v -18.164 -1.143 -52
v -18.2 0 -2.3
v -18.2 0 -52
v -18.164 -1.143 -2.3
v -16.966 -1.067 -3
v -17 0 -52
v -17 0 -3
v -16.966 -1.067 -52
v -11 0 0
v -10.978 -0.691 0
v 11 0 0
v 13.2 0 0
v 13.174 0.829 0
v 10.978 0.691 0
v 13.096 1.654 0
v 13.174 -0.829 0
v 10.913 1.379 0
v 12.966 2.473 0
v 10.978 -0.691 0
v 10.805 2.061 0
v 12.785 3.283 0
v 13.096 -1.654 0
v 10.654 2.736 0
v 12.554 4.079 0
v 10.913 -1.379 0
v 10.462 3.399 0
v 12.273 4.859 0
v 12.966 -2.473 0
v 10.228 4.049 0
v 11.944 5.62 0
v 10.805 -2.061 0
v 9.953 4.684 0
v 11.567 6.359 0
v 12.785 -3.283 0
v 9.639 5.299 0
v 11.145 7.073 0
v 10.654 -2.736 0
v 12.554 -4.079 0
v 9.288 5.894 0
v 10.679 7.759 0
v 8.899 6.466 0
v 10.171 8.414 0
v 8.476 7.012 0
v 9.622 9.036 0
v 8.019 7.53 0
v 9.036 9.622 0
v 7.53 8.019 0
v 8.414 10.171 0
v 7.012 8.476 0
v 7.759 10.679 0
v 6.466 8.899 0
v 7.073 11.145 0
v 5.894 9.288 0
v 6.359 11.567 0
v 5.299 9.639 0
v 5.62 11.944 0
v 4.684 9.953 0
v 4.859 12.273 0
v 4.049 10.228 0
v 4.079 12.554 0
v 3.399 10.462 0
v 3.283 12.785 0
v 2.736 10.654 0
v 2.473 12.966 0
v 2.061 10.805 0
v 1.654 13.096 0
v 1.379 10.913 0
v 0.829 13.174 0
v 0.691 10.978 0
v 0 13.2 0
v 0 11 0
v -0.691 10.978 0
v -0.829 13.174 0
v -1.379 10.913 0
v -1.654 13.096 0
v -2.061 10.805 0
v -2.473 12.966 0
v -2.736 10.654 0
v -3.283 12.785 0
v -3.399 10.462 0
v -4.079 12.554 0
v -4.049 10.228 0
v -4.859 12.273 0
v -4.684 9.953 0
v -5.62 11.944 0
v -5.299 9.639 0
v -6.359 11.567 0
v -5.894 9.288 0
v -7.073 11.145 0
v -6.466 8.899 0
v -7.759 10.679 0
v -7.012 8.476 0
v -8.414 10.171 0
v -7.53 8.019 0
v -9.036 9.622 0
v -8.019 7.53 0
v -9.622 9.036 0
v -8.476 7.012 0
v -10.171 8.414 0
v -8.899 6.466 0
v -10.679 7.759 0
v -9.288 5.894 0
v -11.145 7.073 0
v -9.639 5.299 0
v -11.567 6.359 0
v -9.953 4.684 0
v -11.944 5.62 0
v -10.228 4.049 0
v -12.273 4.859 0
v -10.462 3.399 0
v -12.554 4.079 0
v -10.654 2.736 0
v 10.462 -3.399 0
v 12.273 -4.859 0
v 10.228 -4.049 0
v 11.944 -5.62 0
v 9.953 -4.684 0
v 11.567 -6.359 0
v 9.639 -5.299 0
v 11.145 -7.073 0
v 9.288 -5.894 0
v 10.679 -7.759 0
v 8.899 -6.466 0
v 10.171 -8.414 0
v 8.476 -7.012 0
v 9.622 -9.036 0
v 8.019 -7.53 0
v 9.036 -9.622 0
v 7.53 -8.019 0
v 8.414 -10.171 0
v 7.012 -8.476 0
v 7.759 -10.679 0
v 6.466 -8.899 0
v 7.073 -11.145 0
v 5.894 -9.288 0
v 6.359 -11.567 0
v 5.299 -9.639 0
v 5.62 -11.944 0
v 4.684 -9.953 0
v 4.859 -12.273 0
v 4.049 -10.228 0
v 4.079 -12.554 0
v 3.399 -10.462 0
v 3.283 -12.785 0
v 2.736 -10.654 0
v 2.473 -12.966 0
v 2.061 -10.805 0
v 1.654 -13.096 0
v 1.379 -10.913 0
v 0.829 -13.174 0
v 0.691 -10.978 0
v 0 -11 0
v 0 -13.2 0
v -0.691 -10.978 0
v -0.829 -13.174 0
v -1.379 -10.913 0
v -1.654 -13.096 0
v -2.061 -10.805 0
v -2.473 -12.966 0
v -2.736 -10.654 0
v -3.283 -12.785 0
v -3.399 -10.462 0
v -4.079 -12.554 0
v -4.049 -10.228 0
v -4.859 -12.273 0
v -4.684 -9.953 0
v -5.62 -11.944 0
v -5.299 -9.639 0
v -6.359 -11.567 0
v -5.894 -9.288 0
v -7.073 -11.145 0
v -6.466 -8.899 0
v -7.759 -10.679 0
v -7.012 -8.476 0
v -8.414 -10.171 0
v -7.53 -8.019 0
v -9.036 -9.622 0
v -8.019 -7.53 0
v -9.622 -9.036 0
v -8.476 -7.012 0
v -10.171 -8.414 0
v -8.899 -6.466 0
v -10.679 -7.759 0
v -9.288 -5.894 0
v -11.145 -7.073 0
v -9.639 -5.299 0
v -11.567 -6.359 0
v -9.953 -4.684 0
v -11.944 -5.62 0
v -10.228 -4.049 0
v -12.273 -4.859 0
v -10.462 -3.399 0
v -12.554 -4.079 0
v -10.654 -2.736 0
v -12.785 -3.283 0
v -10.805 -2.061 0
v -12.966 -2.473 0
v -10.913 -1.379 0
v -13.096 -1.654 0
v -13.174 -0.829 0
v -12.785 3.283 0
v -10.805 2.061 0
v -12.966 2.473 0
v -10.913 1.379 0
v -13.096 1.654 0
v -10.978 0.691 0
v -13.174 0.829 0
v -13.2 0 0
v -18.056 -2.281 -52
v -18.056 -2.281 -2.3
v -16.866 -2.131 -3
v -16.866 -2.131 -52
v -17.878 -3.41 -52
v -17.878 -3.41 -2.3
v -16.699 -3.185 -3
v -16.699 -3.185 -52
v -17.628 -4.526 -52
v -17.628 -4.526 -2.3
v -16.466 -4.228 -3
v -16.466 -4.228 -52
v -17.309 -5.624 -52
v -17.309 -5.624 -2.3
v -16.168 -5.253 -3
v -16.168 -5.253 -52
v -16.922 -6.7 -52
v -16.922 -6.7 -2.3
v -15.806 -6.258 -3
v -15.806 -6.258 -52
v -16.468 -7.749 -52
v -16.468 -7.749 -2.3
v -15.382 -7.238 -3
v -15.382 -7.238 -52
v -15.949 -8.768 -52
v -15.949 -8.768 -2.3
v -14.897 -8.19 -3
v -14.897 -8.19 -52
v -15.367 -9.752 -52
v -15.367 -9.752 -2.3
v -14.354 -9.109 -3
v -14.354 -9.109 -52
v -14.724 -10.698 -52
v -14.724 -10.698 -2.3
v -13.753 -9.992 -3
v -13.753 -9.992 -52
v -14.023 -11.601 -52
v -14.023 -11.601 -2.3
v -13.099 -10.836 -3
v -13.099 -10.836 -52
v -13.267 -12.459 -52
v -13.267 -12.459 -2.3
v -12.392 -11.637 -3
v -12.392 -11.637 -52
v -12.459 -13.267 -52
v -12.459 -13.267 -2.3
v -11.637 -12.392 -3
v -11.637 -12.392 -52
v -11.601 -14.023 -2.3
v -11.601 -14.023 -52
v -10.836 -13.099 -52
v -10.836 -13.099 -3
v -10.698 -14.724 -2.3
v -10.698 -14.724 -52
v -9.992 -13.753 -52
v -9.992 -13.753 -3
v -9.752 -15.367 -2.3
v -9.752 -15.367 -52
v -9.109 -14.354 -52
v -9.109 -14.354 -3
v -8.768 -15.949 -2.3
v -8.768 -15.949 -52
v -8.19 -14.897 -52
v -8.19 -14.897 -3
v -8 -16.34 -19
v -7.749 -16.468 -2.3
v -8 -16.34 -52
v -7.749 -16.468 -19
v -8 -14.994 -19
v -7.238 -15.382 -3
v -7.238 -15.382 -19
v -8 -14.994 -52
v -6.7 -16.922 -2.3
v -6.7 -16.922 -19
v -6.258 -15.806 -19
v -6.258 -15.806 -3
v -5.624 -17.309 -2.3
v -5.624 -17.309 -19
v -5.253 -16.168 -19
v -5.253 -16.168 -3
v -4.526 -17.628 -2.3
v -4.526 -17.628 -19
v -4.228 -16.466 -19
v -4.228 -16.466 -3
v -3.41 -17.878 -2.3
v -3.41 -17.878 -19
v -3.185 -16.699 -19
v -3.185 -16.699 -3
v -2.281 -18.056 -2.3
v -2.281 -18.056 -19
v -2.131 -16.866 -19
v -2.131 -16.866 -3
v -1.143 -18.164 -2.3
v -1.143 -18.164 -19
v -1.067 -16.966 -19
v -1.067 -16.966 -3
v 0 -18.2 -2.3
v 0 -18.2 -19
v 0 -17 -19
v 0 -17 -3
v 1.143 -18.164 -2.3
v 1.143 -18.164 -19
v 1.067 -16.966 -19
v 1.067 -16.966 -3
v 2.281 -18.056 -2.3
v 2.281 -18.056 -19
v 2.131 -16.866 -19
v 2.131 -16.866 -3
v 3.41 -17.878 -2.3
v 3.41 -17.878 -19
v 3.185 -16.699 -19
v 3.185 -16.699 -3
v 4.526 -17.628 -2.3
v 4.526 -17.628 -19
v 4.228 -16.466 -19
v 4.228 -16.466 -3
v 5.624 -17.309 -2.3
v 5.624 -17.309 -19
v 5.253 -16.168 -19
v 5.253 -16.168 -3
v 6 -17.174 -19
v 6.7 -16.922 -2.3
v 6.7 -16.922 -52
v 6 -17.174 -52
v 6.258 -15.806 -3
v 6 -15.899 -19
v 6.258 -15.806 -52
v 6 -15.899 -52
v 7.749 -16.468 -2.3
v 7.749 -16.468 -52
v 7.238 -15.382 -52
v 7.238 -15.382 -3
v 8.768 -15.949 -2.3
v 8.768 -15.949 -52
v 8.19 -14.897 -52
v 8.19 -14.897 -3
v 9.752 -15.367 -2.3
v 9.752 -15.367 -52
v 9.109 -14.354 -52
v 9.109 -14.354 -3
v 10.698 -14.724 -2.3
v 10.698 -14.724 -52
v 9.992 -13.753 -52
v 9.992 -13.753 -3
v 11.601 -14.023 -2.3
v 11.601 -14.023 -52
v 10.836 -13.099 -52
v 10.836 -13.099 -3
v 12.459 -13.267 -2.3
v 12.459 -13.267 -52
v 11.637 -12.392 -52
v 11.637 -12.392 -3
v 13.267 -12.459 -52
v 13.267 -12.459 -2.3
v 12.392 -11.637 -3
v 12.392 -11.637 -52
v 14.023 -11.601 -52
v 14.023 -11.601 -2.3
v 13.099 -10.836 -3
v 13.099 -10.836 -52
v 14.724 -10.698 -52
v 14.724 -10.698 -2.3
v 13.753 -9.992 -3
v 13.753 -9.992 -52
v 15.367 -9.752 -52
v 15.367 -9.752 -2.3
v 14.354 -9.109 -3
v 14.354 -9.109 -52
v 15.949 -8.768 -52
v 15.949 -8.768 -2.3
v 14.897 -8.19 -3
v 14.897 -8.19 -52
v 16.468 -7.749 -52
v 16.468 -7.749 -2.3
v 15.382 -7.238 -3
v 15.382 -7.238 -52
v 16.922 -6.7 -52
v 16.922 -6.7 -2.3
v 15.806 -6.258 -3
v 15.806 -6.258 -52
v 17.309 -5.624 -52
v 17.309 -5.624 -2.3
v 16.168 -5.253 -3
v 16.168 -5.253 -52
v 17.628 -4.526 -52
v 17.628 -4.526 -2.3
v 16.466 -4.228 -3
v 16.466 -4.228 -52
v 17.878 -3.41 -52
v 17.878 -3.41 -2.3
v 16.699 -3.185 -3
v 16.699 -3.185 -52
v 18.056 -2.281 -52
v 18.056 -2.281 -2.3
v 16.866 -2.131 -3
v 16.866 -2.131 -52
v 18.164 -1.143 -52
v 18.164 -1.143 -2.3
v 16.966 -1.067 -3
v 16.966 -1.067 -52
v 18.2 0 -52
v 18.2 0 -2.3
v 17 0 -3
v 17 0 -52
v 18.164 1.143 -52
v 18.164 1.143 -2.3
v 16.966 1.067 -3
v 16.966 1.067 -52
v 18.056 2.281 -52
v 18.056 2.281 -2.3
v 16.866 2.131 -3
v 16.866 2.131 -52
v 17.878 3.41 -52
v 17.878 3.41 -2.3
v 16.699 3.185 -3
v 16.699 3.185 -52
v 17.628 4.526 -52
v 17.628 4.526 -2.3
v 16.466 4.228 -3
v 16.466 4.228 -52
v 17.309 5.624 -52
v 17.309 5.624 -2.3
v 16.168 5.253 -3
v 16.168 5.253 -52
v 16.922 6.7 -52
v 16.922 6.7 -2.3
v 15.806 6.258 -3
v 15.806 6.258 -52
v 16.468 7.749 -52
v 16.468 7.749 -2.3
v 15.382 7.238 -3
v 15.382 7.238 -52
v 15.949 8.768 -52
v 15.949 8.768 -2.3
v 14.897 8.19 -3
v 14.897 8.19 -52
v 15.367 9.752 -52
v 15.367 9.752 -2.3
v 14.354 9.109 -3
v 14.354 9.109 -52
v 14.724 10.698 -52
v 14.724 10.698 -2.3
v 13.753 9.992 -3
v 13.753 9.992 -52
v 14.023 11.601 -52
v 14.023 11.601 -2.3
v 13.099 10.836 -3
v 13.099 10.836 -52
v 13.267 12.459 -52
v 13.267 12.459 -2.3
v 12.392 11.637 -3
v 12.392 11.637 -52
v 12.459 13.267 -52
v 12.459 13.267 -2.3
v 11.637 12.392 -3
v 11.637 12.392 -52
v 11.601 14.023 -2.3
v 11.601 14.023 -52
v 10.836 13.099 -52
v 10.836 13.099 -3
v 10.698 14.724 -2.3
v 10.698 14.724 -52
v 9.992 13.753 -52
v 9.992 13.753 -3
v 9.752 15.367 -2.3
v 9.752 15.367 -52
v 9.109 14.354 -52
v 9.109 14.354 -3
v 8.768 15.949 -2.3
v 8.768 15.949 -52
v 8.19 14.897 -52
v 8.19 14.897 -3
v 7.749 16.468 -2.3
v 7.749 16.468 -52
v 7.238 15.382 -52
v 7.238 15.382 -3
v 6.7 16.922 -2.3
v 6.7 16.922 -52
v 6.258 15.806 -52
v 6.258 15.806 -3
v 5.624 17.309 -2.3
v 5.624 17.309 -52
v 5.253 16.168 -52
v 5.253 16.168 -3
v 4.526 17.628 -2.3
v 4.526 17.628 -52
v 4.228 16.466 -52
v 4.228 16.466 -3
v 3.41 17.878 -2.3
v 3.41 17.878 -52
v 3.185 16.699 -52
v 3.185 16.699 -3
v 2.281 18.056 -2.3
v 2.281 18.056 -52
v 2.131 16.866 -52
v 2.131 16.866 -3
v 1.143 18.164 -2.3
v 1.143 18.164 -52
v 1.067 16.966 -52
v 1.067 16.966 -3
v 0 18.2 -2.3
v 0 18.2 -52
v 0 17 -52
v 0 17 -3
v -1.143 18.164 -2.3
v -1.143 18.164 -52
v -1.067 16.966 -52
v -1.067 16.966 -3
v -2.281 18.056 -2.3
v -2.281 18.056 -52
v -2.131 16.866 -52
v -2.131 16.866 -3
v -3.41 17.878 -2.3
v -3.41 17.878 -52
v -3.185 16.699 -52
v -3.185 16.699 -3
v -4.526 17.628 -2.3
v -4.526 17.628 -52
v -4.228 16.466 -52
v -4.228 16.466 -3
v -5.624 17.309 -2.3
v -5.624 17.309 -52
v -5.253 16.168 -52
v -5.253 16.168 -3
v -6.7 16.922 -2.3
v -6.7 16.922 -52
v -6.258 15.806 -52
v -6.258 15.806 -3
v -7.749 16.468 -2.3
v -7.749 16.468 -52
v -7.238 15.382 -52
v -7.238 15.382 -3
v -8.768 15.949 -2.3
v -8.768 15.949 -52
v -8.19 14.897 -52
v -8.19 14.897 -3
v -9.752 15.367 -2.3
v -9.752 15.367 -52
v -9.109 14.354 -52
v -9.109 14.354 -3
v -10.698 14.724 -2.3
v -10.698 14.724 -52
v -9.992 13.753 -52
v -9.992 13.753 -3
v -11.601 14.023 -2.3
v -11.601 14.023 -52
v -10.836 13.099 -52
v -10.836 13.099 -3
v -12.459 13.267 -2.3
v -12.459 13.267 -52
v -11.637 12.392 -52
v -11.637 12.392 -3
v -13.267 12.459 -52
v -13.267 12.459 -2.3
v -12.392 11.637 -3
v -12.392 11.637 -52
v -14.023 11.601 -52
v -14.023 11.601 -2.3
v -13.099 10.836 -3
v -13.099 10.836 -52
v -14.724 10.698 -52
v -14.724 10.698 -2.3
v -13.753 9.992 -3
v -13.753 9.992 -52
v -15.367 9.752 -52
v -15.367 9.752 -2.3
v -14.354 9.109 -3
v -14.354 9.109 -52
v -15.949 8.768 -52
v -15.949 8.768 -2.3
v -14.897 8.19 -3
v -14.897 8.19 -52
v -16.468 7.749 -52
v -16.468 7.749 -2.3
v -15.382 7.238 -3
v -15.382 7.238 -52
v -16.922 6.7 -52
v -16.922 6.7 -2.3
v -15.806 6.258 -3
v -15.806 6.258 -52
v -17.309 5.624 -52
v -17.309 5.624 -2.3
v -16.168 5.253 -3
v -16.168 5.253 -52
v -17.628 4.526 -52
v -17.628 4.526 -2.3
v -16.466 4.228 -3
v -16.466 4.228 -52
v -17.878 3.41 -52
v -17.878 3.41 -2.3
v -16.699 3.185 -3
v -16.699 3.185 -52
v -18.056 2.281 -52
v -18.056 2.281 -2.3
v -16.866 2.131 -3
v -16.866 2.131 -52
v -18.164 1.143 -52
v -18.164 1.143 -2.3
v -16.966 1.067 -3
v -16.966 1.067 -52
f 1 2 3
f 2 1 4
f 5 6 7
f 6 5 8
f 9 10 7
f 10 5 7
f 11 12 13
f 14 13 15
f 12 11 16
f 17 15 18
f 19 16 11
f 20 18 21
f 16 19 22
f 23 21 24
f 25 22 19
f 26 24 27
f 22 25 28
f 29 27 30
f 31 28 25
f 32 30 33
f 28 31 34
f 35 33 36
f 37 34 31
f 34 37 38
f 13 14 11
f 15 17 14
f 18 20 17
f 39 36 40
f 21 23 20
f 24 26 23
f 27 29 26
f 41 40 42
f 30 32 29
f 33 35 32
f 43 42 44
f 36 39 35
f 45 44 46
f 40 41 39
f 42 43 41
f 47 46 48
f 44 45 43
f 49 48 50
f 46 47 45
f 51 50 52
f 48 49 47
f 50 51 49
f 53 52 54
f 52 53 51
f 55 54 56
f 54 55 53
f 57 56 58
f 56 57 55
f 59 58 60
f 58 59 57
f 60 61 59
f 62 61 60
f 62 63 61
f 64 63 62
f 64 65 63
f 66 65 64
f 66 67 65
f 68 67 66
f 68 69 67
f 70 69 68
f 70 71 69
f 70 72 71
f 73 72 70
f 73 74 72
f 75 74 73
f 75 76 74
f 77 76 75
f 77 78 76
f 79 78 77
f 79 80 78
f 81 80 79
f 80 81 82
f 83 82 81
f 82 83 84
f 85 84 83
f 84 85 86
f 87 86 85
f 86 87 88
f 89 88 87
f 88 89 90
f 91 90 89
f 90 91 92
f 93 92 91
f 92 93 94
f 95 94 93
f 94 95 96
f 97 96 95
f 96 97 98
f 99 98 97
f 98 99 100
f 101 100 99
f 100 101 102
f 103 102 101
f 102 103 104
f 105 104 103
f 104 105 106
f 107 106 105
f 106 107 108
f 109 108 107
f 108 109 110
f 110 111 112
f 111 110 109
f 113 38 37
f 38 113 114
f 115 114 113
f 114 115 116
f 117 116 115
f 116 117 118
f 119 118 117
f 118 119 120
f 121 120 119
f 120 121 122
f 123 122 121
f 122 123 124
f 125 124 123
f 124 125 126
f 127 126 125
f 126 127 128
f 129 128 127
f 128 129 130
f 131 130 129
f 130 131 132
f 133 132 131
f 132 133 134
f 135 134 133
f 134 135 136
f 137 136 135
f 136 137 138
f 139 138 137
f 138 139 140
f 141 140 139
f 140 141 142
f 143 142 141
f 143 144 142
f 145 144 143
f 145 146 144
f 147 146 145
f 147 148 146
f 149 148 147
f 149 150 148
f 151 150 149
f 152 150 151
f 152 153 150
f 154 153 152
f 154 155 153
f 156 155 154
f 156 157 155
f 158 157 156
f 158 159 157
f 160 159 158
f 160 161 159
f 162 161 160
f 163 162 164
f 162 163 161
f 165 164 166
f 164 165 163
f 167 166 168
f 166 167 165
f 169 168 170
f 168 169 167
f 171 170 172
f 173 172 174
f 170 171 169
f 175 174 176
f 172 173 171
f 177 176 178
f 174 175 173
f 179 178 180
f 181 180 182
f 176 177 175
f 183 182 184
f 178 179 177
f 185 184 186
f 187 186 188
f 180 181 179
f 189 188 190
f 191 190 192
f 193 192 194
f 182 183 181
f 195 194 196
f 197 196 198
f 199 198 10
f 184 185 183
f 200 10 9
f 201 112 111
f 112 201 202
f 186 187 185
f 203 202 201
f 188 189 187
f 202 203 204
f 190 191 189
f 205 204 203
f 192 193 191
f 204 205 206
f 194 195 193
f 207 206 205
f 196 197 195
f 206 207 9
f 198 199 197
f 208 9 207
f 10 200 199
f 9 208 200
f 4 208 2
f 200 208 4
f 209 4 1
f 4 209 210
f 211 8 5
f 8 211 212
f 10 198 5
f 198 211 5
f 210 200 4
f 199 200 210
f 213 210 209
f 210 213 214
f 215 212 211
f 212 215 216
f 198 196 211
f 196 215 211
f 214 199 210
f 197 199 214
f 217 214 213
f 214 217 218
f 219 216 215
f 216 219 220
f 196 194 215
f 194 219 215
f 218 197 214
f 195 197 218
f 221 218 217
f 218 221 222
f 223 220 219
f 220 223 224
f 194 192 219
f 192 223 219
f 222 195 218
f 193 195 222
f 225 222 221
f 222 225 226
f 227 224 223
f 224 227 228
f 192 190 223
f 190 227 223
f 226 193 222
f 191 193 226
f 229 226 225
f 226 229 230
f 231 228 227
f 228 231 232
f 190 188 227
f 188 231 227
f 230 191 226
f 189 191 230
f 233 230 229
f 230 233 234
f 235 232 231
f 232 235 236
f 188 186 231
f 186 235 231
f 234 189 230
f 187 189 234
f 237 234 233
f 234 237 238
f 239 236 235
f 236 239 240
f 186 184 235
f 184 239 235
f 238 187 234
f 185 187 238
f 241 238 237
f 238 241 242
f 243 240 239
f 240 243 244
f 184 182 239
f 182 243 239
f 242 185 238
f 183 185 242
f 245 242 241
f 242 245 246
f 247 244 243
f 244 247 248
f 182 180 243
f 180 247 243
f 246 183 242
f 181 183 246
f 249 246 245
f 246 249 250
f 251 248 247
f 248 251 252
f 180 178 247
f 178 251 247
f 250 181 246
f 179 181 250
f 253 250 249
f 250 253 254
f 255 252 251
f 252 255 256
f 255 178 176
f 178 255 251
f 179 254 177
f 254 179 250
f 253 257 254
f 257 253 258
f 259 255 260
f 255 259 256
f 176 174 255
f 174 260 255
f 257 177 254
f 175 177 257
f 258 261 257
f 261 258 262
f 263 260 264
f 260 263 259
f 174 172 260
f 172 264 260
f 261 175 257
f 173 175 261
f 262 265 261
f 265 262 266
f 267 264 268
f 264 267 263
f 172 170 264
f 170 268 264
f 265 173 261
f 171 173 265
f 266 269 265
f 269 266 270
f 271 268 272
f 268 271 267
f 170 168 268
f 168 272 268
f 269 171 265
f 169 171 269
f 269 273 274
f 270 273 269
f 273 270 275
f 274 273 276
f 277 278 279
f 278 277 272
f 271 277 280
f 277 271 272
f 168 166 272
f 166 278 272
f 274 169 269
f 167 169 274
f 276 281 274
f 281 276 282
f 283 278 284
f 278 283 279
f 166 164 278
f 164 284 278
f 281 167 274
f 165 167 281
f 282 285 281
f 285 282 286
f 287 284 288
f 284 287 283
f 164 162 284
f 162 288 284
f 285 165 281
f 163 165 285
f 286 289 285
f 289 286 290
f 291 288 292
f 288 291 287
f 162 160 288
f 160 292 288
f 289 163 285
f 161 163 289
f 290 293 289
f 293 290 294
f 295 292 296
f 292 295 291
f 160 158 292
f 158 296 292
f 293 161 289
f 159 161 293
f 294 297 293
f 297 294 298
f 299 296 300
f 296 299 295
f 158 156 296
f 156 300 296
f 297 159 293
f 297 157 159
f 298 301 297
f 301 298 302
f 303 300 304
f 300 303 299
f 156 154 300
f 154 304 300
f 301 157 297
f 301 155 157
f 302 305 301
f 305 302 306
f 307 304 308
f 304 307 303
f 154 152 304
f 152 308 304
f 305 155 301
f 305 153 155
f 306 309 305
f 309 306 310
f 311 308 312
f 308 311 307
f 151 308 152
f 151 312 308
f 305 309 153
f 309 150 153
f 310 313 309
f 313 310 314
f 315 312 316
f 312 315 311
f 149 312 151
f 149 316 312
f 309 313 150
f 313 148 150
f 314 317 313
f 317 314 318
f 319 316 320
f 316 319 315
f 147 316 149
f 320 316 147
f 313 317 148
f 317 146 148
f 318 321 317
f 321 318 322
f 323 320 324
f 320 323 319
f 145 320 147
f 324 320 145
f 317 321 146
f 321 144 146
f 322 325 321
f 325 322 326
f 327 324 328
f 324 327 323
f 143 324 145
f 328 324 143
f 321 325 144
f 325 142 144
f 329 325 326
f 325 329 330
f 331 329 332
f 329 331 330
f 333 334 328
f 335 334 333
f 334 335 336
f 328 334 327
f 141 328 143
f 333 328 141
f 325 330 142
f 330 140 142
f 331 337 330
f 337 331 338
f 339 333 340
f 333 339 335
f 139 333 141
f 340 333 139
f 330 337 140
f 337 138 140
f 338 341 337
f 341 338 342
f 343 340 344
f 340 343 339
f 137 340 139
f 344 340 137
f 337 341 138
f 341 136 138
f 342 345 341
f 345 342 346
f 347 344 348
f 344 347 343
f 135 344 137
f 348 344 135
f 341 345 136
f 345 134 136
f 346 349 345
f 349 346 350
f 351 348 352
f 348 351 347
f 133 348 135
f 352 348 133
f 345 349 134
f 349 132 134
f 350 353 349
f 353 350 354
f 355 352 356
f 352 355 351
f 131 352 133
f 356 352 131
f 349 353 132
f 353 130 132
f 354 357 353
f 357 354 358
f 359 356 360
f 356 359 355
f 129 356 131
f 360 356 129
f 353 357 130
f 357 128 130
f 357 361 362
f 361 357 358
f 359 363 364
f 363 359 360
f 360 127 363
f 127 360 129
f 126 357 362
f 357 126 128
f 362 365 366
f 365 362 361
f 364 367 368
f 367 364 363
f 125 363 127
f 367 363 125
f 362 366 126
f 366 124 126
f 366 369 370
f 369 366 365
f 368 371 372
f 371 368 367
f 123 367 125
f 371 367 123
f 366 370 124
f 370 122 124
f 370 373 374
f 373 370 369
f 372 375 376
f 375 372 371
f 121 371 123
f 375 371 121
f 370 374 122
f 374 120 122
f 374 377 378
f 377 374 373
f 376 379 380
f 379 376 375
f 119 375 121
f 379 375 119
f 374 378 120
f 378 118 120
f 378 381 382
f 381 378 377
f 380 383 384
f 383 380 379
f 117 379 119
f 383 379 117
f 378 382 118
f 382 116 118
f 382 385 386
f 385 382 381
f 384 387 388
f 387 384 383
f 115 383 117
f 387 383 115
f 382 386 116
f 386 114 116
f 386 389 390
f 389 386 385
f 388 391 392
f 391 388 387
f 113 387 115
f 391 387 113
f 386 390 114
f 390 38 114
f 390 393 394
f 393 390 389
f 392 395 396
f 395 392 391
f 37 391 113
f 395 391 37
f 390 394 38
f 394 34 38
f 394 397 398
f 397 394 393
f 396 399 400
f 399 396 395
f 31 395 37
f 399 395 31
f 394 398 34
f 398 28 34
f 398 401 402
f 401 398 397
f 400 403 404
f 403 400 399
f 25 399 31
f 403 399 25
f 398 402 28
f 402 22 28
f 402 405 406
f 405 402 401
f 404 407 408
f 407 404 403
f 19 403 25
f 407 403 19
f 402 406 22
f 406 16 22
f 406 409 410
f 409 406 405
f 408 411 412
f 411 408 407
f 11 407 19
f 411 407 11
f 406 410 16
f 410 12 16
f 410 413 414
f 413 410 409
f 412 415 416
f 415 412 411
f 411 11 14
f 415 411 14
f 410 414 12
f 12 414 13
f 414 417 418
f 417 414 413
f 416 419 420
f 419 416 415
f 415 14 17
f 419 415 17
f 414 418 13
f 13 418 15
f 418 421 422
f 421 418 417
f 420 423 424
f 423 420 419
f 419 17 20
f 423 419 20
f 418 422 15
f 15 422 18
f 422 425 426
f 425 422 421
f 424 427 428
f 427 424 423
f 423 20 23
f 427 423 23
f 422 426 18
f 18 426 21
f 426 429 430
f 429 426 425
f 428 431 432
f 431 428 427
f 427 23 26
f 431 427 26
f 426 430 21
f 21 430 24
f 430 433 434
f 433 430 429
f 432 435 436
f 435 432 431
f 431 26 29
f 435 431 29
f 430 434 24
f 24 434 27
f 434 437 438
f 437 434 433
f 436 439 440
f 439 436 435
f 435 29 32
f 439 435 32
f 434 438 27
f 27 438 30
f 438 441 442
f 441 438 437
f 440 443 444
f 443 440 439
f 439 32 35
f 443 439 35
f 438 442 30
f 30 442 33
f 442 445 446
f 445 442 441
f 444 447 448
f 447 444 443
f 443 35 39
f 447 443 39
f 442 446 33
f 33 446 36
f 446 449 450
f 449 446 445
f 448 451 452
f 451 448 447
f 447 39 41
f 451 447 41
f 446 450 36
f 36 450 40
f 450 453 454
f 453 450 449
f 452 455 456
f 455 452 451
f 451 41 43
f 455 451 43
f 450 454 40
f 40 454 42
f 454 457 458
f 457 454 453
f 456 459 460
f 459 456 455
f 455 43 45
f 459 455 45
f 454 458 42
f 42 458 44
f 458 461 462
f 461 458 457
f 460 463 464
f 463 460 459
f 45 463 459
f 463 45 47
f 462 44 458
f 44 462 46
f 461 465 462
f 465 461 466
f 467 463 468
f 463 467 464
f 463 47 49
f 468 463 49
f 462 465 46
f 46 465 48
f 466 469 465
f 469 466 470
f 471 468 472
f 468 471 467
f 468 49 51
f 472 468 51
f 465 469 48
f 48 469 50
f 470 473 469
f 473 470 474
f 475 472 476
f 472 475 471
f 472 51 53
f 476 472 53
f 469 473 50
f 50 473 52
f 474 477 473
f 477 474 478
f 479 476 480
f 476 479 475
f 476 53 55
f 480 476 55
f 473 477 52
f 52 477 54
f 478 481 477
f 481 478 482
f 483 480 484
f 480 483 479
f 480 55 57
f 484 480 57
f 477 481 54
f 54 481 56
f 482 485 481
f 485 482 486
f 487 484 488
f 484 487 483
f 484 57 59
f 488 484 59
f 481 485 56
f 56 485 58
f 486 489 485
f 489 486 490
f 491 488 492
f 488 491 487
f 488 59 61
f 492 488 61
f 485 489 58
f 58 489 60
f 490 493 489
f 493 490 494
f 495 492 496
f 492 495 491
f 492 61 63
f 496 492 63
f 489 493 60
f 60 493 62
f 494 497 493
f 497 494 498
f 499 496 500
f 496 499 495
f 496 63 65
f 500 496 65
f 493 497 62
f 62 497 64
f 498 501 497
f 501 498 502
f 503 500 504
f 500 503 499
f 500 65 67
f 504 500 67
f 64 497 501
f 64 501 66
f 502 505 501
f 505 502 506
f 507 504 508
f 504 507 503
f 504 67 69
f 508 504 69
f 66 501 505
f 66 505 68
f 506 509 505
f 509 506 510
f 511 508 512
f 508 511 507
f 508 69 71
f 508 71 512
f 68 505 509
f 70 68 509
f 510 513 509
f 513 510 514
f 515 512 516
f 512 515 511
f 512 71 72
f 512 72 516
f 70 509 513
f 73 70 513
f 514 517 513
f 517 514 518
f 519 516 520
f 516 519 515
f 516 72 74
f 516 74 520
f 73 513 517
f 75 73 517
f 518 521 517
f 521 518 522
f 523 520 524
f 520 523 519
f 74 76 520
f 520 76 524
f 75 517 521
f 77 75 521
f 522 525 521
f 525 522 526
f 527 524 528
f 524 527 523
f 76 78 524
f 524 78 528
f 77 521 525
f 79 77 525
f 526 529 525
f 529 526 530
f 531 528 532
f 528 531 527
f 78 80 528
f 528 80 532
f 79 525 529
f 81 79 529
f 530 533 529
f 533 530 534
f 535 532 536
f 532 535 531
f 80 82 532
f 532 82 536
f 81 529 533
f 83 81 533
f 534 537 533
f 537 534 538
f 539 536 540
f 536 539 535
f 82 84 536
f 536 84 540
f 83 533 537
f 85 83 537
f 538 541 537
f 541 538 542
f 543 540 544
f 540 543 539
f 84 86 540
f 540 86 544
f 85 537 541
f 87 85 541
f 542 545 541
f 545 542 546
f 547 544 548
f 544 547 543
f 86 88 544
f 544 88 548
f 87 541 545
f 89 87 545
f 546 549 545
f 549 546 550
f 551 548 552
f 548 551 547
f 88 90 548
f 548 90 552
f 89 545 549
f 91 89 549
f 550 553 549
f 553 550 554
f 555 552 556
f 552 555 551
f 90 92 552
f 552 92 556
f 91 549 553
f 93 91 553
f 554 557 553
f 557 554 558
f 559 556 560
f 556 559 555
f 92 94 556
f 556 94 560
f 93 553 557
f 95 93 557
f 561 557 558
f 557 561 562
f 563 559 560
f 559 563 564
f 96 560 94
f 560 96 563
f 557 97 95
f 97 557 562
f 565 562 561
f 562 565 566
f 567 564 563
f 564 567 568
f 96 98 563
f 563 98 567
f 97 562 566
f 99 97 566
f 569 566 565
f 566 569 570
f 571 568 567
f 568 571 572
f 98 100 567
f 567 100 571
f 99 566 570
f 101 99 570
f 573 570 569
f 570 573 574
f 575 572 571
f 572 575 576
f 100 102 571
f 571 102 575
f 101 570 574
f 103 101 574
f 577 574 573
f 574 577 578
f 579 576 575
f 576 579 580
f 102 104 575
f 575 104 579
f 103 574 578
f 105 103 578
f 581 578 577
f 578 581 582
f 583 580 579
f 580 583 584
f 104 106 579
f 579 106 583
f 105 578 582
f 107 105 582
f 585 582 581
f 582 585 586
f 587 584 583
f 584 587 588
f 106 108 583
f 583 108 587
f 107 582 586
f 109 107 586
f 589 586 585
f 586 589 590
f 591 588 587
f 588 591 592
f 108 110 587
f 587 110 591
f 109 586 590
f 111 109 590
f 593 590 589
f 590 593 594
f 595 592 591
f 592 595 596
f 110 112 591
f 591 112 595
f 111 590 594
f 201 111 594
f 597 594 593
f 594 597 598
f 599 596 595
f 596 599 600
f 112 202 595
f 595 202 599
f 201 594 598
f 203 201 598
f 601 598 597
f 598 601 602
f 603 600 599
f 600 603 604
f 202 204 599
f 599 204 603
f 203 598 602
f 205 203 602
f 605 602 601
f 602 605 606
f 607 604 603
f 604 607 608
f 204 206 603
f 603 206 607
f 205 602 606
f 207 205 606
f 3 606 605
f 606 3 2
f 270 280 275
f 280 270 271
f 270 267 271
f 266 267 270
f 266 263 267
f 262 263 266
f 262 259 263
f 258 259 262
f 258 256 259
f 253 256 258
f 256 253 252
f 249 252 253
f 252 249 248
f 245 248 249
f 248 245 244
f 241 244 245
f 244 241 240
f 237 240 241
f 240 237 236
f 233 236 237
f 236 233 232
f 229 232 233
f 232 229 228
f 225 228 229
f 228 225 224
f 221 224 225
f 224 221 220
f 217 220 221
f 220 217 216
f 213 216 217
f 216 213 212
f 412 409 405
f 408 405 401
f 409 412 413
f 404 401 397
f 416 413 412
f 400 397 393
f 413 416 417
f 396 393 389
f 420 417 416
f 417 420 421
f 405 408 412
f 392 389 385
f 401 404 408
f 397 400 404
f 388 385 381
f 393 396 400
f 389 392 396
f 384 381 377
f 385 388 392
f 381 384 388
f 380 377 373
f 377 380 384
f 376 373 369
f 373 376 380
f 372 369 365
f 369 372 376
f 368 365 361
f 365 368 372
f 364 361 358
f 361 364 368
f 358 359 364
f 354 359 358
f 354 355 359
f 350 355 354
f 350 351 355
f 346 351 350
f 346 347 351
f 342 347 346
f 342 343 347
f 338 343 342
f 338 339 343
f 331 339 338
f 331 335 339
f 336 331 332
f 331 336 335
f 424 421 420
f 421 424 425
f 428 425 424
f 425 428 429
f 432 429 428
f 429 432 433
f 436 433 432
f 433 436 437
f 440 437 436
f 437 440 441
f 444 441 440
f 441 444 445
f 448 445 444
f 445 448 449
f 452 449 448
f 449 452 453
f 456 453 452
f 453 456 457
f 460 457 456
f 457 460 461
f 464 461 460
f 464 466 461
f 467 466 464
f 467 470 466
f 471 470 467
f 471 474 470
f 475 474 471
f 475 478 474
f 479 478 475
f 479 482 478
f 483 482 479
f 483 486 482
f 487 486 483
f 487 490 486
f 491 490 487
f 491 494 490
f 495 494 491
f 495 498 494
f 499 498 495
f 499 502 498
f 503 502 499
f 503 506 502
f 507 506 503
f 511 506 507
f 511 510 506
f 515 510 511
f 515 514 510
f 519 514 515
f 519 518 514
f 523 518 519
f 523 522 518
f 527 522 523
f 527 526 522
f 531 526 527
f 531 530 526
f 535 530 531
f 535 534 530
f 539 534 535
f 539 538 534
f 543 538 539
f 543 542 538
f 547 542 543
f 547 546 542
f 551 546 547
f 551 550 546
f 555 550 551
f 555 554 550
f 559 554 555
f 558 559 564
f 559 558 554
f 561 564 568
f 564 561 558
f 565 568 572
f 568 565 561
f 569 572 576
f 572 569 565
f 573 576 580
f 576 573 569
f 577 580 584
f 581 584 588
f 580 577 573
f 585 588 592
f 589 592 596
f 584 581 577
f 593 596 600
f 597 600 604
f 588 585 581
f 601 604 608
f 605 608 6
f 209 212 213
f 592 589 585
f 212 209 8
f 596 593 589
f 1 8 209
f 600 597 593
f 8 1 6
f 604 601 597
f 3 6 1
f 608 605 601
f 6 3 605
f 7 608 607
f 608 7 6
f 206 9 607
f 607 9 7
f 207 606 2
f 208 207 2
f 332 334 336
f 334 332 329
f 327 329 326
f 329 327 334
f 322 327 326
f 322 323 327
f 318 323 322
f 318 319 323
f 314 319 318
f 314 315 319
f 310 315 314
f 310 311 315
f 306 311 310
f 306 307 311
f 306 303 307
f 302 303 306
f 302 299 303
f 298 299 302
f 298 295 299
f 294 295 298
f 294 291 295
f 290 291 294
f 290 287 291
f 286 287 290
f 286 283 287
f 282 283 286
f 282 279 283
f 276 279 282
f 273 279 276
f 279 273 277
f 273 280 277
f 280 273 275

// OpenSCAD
r1 = 11;
r2 = 17;
s = 1.2;
l = 52;
y=19;
x=9;
w=14;
h=15;

$fn = 100;

print_base = true;
print_hat = false;
rotate([180,0,0]) {
if(print_base) {
difference(){
rotate_extrude()polygon([[r1,0],[r2,3],[r2,l],[r2+s,l],[r2+s,2.3],[r1+s+1,0]]);

translate([-r2+x,0,y]) cube([w,100,100]);
}
}
if(print_hat){
translate([0,0,50]){
translate([0,0,l]) cylinder(s,r2+s,r2+s);
translate([0,0,y+h])difference(){
    cylinder(l-y-h,r2-0.2,r2-0.2);
    cylinder(l-y-h,r2-s-0.2,r2-s-0.2);
    }
}
}
}
